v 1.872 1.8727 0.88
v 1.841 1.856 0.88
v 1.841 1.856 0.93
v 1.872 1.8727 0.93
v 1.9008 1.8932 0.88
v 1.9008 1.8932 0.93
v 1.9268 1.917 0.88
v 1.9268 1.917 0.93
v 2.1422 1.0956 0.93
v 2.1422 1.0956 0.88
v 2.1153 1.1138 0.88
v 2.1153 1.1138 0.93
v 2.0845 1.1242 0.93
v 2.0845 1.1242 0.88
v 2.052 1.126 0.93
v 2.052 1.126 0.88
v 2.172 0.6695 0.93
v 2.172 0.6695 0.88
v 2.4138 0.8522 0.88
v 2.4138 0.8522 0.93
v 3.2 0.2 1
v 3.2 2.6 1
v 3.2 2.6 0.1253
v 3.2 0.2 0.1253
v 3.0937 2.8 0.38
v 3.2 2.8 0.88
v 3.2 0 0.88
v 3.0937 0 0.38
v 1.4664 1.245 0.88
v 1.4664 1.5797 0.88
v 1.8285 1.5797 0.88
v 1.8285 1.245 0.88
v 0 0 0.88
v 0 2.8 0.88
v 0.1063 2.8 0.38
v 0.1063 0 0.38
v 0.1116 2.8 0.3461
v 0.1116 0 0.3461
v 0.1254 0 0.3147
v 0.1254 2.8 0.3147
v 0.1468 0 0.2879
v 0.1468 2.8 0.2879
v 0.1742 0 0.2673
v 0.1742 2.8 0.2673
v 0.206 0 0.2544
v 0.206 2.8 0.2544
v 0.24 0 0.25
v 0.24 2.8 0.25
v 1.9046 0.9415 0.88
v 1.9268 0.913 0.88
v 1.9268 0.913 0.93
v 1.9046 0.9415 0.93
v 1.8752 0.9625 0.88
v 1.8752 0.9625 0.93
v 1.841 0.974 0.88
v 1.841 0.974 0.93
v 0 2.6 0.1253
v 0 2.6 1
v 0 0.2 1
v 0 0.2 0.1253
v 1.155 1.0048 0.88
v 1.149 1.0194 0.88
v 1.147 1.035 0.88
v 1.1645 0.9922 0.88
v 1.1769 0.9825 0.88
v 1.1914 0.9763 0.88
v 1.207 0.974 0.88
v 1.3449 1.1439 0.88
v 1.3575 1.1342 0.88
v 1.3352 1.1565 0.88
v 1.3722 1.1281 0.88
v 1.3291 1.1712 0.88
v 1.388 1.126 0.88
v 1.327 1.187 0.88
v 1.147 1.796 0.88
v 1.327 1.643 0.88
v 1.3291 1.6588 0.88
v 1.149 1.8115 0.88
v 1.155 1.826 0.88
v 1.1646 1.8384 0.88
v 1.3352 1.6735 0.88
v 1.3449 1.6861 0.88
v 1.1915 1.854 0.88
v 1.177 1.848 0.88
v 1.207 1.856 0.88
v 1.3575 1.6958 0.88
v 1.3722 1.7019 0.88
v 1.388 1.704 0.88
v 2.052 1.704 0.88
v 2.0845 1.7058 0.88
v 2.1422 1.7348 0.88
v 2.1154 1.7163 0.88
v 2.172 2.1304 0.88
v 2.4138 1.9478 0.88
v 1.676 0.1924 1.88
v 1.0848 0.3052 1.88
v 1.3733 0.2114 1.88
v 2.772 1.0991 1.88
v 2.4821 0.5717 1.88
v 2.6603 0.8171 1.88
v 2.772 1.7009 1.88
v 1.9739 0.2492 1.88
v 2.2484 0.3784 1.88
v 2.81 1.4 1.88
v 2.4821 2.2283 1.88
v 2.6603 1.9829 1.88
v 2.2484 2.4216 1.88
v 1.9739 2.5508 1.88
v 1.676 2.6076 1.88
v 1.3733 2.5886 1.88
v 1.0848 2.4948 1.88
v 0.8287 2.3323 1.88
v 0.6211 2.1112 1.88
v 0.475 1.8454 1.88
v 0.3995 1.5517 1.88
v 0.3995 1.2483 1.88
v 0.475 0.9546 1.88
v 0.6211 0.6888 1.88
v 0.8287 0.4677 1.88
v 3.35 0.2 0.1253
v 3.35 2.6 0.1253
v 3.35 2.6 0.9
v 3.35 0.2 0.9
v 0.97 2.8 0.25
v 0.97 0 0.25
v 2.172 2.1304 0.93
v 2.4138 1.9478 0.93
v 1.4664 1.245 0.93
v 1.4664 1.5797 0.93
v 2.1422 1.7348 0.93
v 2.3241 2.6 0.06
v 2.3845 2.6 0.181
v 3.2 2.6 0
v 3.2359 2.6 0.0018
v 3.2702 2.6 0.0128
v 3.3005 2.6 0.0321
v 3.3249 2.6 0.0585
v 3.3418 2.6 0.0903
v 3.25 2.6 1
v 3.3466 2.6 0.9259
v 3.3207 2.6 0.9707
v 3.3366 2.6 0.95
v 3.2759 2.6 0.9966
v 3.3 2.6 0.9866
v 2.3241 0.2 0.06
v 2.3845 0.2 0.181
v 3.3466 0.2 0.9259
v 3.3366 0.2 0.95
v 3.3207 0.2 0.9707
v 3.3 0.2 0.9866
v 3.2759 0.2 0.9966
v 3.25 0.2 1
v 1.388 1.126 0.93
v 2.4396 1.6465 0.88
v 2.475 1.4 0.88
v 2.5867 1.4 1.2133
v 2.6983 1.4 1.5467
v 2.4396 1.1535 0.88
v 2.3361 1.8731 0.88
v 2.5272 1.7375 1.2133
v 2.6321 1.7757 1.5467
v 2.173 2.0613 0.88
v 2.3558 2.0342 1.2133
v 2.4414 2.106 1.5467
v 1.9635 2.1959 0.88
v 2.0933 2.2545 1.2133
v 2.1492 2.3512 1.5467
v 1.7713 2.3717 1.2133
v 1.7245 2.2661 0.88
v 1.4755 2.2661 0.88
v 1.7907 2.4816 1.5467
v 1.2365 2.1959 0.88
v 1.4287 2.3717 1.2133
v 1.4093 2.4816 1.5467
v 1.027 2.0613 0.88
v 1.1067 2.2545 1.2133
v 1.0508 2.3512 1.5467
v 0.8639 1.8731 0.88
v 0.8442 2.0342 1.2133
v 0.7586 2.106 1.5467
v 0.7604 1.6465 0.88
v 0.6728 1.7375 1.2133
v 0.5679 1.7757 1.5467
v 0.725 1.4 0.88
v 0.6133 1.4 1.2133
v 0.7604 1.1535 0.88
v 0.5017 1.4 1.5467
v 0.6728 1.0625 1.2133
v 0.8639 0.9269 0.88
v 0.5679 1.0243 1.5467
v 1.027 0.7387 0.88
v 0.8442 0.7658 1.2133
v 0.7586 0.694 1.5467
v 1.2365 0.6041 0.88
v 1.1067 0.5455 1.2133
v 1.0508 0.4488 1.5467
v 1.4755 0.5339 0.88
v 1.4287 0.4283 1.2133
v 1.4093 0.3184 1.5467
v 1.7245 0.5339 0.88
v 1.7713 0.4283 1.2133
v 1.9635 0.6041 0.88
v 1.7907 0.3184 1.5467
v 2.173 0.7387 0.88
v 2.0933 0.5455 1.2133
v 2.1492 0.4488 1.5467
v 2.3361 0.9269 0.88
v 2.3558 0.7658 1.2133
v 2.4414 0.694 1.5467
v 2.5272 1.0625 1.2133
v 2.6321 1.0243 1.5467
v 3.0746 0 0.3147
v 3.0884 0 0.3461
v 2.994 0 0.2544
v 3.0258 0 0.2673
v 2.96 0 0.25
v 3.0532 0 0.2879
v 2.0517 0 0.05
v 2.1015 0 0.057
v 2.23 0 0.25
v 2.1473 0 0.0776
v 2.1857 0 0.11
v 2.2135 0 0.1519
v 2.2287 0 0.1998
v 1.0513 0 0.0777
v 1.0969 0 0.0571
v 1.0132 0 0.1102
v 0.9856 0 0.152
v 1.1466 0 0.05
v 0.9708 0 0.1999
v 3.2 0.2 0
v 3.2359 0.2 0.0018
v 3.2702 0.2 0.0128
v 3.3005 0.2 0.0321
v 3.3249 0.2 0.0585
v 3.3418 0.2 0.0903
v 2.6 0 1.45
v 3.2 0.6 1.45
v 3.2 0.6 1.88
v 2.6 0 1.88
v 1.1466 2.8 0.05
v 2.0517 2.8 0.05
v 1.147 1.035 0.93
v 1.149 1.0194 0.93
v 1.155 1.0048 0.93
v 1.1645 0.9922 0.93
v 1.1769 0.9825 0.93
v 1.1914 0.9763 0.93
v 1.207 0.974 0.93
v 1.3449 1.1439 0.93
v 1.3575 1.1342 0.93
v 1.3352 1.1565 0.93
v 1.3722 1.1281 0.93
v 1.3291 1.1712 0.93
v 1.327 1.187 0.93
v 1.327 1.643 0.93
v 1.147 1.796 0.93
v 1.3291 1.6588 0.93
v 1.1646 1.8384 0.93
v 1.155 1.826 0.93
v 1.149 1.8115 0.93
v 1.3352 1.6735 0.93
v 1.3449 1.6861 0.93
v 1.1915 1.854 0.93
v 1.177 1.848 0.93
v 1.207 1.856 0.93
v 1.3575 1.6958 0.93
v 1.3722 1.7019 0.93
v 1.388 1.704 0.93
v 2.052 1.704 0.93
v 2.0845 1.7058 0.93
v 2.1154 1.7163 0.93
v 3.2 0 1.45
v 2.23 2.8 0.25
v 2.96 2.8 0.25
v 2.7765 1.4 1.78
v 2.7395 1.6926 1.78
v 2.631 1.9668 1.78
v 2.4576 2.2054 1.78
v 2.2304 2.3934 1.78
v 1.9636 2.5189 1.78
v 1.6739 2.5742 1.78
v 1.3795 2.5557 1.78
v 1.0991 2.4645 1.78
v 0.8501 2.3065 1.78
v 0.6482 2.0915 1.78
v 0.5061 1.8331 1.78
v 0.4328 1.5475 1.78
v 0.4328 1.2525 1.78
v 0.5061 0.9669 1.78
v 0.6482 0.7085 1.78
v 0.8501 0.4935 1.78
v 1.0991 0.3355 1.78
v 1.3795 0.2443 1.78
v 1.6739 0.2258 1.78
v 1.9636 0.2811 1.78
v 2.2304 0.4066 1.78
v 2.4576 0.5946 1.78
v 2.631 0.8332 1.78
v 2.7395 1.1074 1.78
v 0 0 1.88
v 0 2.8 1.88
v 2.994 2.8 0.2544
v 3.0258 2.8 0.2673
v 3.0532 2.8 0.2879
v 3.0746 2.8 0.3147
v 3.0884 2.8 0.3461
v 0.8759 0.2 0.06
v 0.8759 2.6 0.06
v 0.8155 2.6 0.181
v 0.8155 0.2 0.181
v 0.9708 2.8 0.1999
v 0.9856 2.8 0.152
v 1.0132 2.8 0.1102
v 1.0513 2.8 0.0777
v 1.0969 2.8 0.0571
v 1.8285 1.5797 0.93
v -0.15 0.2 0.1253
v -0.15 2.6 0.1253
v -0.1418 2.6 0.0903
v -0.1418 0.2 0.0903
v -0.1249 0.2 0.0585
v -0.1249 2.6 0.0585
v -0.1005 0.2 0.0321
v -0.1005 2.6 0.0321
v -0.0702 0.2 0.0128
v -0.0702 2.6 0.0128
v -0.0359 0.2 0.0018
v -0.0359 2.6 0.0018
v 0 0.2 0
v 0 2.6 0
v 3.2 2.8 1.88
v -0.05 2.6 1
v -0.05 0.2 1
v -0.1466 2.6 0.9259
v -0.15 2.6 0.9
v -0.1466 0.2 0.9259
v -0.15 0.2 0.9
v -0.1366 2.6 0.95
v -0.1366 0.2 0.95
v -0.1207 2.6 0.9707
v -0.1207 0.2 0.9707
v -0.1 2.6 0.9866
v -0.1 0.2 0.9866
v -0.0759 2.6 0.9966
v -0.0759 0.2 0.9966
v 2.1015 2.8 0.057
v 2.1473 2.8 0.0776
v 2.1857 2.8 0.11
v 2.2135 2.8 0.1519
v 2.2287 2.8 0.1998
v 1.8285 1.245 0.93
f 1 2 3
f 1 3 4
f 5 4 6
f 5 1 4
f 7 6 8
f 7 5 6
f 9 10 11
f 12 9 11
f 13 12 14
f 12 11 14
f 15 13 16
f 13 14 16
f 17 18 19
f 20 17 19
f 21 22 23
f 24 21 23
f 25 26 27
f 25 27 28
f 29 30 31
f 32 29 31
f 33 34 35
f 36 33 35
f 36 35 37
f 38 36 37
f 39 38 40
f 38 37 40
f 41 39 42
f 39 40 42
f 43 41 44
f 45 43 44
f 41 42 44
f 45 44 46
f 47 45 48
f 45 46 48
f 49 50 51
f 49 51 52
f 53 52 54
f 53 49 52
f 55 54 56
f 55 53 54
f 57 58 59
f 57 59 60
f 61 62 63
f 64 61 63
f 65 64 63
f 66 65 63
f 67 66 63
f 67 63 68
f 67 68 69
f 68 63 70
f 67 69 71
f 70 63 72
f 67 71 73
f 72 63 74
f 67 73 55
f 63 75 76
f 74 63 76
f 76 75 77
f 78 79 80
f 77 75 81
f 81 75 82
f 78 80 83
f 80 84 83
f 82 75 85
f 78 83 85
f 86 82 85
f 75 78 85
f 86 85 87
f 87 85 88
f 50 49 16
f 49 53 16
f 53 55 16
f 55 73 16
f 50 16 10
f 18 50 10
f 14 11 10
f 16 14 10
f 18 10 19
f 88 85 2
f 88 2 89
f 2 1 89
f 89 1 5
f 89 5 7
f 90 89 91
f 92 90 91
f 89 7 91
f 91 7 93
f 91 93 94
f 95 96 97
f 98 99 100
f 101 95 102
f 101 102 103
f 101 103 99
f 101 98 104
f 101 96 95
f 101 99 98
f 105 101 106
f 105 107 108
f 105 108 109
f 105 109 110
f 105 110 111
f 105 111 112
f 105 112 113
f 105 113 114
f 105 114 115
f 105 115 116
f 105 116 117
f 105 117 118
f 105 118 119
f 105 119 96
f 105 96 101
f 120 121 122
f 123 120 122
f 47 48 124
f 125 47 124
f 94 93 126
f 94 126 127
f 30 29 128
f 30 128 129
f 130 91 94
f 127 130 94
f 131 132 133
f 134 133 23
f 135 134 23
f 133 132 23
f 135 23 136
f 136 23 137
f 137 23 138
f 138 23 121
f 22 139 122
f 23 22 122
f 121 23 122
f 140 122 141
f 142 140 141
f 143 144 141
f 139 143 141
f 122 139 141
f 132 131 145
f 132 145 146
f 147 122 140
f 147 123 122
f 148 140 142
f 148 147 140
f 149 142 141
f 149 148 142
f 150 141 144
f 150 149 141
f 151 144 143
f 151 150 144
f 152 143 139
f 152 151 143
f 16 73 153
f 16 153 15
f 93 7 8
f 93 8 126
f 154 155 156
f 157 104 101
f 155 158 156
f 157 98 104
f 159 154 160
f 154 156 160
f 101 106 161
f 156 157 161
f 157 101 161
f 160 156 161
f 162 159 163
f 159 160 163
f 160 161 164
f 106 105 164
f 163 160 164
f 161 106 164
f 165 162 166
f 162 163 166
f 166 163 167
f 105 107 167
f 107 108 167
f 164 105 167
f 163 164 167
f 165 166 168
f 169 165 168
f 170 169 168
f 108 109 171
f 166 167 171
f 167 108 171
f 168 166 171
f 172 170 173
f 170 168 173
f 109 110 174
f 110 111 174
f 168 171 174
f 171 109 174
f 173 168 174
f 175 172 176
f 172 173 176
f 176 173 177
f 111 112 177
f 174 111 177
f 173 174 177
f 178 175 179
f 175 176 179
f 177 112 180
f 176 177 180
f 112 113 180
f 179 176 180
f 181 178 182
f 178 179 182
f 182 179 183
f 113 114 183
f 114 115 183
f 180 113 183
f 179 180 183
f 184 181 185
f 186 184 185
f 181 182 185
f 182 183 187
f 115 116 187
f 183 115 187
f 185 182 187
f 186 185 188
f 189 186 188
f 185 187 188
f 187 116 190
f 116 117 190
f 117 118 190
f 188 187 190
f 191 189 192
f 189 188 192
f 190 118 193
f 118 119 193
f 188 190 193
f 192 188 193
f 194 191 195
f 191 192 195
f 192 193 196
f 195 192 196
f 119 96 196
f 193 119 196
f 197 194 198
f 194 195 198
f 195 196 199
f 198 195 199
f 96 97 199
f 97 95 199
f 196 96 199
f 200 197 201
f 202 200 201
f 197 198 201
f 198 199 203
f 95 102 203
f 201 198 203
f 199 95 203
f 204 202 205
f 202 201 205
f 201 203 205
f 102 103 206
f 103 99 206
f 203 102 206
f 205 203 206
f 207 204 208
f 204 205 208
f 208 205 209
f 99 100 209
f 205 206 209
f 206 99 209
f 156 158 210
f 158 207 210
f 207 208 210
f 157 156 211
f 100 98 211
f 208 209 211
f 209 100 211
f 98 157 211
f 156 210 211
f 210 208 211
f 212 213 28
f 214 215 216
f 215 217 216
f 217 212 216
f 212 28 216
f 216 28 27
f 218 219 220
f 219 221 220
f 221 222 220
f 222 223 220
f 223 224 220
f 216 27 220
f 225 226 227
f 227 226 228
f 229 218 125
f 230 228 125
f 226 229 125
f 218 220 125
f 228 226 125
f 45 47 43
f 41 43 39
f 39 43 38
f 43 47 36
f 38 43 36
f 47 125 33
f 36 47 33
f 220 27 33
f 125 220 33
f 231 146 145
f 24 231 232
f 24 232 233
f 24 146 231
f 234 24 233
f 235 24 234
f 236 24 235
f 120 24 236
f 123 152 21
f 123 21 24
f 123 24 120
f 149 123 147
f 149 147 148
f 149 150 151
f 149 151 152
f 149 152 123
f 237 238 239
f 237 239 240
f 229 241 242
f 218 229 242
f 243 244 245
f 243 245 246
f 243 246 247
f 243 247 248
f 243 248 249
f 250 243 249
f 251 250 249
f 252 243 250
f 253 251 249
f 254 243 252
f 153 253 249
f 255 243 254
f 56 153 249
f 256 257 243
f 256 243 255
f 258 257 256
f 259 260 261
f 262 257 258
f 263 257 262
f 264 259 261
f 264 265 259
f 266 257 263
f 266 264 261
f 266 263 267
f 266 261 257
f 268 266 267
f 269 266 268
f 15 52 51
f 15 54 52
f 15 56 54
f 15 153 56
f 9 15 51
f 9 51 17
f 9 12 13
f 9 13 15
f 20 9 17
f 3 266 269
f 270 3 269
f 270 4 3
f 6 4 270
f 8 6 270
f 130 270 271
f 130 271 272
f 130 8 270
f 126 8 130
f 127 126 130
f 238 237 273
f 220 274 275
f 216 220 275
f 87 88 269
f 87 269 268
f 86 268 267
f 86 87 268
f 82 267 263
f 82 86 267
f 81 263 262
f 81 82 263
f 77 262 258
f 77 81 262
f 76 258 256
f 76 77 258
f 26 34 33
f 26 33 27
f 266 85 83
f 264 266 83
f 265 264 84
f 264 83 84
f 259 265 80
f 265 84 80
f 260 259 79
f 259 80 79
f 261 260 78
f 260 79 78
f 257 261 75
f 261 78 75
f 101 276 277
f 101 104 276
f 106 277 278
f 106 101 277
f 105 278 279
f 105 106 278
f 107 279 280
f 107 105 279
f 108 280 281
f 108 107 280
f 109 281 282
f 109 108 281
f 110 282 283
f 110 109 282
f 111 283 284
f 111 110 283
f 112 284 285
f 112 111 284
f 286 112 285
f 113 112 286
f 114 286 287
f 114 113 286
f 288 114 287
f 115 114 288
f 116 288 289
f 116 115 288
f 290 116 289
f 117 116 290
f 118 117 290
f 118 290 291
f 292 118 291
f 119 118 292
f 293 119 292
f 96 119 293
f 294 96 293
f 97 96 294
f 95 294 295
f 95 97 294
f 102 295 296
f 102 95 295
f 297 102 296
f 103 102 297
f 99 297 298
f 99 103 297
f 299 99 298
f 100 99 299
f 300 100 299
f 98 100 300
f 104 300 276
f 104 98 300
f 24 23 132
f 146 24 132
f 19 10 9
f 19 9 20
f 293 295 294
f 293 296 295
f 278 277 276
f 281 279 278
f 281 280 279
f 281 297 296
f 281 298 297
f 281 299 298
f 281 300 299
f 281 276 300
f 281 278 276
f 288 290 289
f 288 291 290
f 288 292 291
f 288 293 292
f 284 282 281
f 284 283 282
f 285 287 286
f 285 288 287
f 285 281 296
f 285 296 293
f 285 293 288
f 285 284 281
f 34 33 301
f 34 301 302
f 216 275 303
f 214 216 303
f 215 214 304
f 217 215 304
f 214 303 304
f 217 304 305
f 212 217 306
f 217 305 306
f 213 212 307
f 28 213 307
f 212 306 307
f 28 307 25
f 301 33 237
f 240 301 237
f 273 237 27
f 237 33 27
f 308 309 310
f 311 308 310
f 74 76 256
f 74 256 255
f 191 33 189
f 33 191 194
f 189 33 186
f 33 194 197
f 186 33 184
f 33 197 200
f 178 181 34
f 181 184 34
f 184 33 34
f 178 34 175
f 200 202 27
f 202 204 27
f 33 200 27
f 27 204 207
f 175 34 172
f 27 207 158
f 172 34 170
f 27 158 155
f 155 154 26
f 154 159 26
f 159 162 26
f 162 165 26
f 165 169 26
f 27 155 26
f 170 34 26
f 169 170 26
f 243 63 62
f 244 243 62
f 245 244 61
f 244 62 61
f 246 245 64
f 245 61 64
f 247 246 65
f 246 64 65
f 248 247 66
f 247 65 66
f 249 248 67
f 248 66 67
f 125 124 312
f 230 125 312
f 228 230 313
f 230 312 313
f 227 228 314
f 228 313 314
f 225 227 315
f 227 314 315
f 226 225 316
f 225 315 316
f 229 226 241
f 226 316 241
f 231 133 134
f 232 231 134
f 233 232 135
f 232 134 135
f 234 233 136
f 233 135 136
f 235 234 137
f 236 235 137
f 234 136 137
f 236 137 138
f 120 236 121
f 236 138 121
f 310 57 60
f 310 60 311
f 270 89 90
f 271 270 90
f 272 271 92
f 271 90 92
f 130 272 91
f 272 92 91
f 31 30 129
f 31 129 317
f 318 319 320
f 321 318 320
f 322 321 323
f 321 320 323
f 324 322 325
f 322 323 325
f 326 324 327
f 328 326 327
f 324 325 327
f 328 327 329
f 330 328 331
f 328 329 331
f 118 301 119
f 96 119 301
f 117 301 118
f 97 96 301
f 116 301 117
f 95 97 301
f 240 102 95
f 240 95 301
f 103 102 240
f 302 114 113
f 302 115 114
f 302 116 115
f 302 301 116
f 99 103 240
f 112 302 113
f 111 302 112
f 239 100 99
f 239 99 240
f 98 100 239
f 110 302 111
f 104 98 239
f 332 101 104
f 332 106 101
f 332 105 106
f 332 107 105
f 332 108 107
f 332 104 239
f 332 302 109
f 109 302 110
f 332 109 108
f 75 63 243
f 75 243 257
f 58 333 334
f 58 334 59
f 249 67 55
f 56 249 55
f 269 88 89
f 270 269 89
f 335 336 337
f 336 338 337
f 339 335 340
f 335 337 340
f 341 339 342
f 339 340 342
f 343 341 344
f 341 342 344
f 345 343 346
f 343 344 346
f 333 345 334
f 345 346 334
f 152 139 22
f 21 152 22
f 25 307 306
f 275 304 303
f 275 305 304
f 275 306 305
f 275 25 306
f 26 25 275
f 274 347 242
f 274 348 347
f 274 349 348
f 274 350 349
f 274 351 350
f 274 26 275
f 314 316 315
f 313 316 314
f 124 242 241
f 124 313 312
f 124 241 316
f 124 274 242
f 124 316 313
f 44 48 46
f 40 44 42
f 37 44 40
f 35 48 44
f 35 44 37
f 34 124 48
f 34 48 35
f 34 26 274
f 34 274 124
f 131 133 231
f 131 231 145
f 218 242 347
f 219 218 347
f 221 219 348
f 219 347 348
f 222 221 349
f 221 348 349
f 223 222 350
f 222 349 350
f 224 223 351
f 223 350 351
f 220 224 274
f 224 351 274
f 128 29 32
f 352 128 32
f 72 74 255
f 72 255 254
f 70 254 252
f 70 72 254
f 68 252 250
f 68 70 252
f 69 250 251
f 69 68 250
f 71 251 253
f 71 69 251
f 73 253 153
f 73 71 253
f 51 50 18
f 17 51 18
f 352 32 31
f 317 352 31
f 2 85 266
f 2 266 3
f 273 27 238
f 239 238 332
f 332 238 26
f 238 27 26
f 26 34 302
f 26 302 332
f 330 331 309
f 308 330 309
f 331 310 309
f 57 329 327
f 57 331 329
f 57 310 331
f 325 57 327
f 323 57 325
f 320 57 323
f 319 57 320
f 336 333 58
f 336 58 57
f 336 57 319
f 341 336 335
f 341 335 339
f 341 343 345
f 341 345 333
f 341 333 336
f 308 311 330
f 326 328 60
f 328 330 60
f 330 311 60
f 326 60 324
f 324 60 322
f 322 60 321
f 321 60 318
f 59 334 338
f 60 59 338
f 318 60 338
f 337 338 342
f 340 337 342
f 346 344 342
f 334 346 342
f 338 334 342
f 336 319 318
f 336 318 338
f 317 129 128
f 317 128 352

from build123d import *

# Parameters (mm, degrees)
PAD_DEPTH    = 2.8
PAD001_DEPTH = 0.43
BOX_W        = 3.2
BOX_H        = 2.8
BOX_DEPTH    = 1
PAD002_DEPTH = 2.4
FILLET_R     = 0.1
PAD003_DEPTH = 2.4
FILLET001_R  = 0.1
BOX001_W     = 0.3621
BOX001_H     = 0.3347
BOX001_DEPTH = 0.05
PAD004_DEPTH = 0.05


with BuildPart() as pad:
    # Sketch → Pad (new body)
    with BuildSketch(Plane.XZ.offset(-2.8)):
        with BuildLine():
            Line((0, 0.88), (3.2, 0.88))
            Line((3.2, 0.88), (3.093722, 0.38))
            ThreePointArc((2.96, 0.25), (3.053249, 0.287856), (3.093722, 0.38))
            Line((2.23, 0.25), (2.96, 0.25))
            ThreePointArc((2.0517, 0.05), (2.185669, 0.110044), (2.23, 0.25))
            Line((1.14655, 0.05), (2.0517, 0.05))
            ThreePointArc((0.97, 0.25), (1.013162, 0.110176), (1.14655, 0.05))
            Line((0.24, 0.25), (0.97, 0.25))
            ThreePointArc((0.106278, 0.38), (0.146751, 0.287856), (0.24, 0.25))
            Line((0, 0.88), (0.106278, 0.38))
        make_face()
    extrude(amount=PAD_DEPTH)


with BuildPart() as pad001:
    # Sketch001 → Pad001 (new body)
    with BuildSketch(Plane(origin=(2.6, 0, 1.45), x_dir=(1, 0, 0), z_dir=(0, 0, 1))):
        Polygon((0, 0), (0.6, 0), (0.6, 0.6), align=None)
    extrude(amount=PAD001_DEPTH)


with BuildPart() as cone:
    # Cone → Cone (revolve)
    with BuildSketch(Plane(origin=(1.6, 1.4, 0.88), x_dir=(1, 0, 0), z_dir=(0, -1, 0))):
        Polygon((0, 0), (0.875, 0), (1.21, 1), (0, 1), align=None)
    revolve(axis=Axis((1.6, 1.4, 0.88), (0, 0, 1)))


with BuildPart() as cut001:
    # Box → Box (new body)
    with BuildSketch(Plane.XY.offset(0.88)):
        with Locations((1.6, 1.4)):
            Rectangle(BOX_W, BOX_H)
    extrude(amount=BOX_DEPTH)

    # Cut: cut Cone
    add(cone.part, mode=Mode.SUBTRACT)

    # Cut001: cut Pad001
    add(pad001.part, mode=Mode.SUBTRACT)


with BuildPart() as fillet_body:
    # Sketch002 → Pad002 (new body)
    with BuildSketch(Plane.XZ.offset(-2.6)):
        with BuildLine():
            Line((-0.15, 0.1253), (-0.15, 1))
            Line((-0.15, 1), (0, 1))
            Line((0, 1), (0, 0.1253))
            Line((0, 0.1253), (0.8155, 0.181))
            Line((0.8759, 0.06), (0.8155, 0.181))
            Line((0, 0), (0.8759, 0.06))
            ThreePointArc((-0.15, 0.1253), (-0.100536, 0.032081), (0, 0))
        make_face()
    extrude(amount=PAD002_DEPTH)

    # Fillet
    fillet_edges = [fillet_body.edges().sort_by_distance(p)[0] for p in [
        (-0.15, 1.4, 1),
    ]]
    fillet(fillet_edges, radius=FILLET_R)


with BuildPart() as fillet001:
    # Sketch003 → Pad003 (new body)
    with BuildSketch(Plane(origin=(3.2, 2.6, 0), x_dir=(1, 0, 0), z_dir=(0, -1, 0))):
        with BuildLine():
            Line((0.15, 0.1253), (0.15, 1))
            Line((0.15, 1), (0, 1))
            Line((0, 1), (0, 0.1253))
            Line((0, 0.1253), (-0.8155, 0.181))
            Line((-0.8759, 0.06), (-0.8155, 0.181))
            Line((0, 0), (-0.8759, 0.06))
            ThreePointArc((0, 0), (0.100536, 0.032081), (0.15, 0.1253))
        make_face()
    extrude(amount=PAD003_DEPTH)

    # Fillet001
    fillet001_edges = [fillet001.edges().sort_by_distance(p)[0] for p in [
        (3.35, 1.4, 1),
    ]]
    fillet(fillet001_edges, radius=FILLET001_R)


with BuildPart() as cone001:
    # Cone001 → Cone001 (revolve)
    with BuildSketch(Plane(origin=(1.6, 1.4, 1.78), x_dir=(1, 0, 0), z_dir=(0, -1, 0))):
        Polygon((0, 0), (1.1765, 0), (1.21, 0.1), (0, 0.1), align=None)
    revolve(axis=Axis((1.6, 1.4, 1.78), (0, 0, 1)))


with BuildPart() as cube001:
    # Box001 → Box001 (new body)
    with BuildSketch(Plane(origin=(1.4664, 1.245, 0.88), x_dir=(1, 0, 0), z_dir=(0, 0, 1))):
        with Locations((0.18105, 0.16735)):
            Rectangle(BOX001_W, BOX001_H)
    extrude(amount=BOX001_DEPTH)


with BuildPart() as pad004:
    # Sketch004 → Pad004 (new body)
    with BuildSketch(Plane.XY.offset(0.88)):
        with BuildLine():
            Line((1.207, 0.974), (1.841, 0.974))
            ThreePointArc((1.92678, 0.913), (1.890696, 0.95307), (1.841, 0.974))
            Line((1.92678, 0.913), (2.172, 0.6695))
            Line((2.172, 0.6695), (2.4138, 0.8522))
            Line((2.1422, 1.0956), (2.4138, 0.8522))
            ThreePointArc((2.1422, 1.0956), (2.100228, 1.12008), (2.052, 1.126))
            Line((1.388, 1.126), (2.052, 1.126))
            ThreePointArc((1.327, 1.187), (1.344866, 1.143866), (1.388, 1.126))
            Line((1.327, 1.643), (1.327, 1.187))
            ThreePointArc((1.388, 1.704), (1.344866, 1.686134), (1.327, 1.643))
            Line((1.388, 1.704), (2.052, 1.704))
            ThreePointArc((2.052, 1.704), (2.100307, 1.710008), (2.1422, 1.7348))
            Line((2.1422, 1.7348), (2.4138, 1.9478))
            Line((2.172, 2.1304), (2.4138, 1.9478))
            Line((1.92678, 1.917), (2.172, 2.1304))
            ThreePointArc((1.841, 1.856), (1.886736, 1.882498), (1.92678, 1.917))
            Line((1.207, 1.856), (1.841, 1.856))
            ThreePointArc((1.207, 1.856), (1.164574, 1.838426), (1.147, 1.796))
            Line((1.147, 1.035), (1.147, 1.796))
            ThreePointArc((1.147, 1.035), (1.164514, 0.992219), (1.207, 0.974))
        make_face()
    extrude(amount=PAD004_DEPTH)


solid = Compound([pad.part, cut001.part, fillet_body.part, fillet001.part, cone001.part, cube001.part, pad004.part])
